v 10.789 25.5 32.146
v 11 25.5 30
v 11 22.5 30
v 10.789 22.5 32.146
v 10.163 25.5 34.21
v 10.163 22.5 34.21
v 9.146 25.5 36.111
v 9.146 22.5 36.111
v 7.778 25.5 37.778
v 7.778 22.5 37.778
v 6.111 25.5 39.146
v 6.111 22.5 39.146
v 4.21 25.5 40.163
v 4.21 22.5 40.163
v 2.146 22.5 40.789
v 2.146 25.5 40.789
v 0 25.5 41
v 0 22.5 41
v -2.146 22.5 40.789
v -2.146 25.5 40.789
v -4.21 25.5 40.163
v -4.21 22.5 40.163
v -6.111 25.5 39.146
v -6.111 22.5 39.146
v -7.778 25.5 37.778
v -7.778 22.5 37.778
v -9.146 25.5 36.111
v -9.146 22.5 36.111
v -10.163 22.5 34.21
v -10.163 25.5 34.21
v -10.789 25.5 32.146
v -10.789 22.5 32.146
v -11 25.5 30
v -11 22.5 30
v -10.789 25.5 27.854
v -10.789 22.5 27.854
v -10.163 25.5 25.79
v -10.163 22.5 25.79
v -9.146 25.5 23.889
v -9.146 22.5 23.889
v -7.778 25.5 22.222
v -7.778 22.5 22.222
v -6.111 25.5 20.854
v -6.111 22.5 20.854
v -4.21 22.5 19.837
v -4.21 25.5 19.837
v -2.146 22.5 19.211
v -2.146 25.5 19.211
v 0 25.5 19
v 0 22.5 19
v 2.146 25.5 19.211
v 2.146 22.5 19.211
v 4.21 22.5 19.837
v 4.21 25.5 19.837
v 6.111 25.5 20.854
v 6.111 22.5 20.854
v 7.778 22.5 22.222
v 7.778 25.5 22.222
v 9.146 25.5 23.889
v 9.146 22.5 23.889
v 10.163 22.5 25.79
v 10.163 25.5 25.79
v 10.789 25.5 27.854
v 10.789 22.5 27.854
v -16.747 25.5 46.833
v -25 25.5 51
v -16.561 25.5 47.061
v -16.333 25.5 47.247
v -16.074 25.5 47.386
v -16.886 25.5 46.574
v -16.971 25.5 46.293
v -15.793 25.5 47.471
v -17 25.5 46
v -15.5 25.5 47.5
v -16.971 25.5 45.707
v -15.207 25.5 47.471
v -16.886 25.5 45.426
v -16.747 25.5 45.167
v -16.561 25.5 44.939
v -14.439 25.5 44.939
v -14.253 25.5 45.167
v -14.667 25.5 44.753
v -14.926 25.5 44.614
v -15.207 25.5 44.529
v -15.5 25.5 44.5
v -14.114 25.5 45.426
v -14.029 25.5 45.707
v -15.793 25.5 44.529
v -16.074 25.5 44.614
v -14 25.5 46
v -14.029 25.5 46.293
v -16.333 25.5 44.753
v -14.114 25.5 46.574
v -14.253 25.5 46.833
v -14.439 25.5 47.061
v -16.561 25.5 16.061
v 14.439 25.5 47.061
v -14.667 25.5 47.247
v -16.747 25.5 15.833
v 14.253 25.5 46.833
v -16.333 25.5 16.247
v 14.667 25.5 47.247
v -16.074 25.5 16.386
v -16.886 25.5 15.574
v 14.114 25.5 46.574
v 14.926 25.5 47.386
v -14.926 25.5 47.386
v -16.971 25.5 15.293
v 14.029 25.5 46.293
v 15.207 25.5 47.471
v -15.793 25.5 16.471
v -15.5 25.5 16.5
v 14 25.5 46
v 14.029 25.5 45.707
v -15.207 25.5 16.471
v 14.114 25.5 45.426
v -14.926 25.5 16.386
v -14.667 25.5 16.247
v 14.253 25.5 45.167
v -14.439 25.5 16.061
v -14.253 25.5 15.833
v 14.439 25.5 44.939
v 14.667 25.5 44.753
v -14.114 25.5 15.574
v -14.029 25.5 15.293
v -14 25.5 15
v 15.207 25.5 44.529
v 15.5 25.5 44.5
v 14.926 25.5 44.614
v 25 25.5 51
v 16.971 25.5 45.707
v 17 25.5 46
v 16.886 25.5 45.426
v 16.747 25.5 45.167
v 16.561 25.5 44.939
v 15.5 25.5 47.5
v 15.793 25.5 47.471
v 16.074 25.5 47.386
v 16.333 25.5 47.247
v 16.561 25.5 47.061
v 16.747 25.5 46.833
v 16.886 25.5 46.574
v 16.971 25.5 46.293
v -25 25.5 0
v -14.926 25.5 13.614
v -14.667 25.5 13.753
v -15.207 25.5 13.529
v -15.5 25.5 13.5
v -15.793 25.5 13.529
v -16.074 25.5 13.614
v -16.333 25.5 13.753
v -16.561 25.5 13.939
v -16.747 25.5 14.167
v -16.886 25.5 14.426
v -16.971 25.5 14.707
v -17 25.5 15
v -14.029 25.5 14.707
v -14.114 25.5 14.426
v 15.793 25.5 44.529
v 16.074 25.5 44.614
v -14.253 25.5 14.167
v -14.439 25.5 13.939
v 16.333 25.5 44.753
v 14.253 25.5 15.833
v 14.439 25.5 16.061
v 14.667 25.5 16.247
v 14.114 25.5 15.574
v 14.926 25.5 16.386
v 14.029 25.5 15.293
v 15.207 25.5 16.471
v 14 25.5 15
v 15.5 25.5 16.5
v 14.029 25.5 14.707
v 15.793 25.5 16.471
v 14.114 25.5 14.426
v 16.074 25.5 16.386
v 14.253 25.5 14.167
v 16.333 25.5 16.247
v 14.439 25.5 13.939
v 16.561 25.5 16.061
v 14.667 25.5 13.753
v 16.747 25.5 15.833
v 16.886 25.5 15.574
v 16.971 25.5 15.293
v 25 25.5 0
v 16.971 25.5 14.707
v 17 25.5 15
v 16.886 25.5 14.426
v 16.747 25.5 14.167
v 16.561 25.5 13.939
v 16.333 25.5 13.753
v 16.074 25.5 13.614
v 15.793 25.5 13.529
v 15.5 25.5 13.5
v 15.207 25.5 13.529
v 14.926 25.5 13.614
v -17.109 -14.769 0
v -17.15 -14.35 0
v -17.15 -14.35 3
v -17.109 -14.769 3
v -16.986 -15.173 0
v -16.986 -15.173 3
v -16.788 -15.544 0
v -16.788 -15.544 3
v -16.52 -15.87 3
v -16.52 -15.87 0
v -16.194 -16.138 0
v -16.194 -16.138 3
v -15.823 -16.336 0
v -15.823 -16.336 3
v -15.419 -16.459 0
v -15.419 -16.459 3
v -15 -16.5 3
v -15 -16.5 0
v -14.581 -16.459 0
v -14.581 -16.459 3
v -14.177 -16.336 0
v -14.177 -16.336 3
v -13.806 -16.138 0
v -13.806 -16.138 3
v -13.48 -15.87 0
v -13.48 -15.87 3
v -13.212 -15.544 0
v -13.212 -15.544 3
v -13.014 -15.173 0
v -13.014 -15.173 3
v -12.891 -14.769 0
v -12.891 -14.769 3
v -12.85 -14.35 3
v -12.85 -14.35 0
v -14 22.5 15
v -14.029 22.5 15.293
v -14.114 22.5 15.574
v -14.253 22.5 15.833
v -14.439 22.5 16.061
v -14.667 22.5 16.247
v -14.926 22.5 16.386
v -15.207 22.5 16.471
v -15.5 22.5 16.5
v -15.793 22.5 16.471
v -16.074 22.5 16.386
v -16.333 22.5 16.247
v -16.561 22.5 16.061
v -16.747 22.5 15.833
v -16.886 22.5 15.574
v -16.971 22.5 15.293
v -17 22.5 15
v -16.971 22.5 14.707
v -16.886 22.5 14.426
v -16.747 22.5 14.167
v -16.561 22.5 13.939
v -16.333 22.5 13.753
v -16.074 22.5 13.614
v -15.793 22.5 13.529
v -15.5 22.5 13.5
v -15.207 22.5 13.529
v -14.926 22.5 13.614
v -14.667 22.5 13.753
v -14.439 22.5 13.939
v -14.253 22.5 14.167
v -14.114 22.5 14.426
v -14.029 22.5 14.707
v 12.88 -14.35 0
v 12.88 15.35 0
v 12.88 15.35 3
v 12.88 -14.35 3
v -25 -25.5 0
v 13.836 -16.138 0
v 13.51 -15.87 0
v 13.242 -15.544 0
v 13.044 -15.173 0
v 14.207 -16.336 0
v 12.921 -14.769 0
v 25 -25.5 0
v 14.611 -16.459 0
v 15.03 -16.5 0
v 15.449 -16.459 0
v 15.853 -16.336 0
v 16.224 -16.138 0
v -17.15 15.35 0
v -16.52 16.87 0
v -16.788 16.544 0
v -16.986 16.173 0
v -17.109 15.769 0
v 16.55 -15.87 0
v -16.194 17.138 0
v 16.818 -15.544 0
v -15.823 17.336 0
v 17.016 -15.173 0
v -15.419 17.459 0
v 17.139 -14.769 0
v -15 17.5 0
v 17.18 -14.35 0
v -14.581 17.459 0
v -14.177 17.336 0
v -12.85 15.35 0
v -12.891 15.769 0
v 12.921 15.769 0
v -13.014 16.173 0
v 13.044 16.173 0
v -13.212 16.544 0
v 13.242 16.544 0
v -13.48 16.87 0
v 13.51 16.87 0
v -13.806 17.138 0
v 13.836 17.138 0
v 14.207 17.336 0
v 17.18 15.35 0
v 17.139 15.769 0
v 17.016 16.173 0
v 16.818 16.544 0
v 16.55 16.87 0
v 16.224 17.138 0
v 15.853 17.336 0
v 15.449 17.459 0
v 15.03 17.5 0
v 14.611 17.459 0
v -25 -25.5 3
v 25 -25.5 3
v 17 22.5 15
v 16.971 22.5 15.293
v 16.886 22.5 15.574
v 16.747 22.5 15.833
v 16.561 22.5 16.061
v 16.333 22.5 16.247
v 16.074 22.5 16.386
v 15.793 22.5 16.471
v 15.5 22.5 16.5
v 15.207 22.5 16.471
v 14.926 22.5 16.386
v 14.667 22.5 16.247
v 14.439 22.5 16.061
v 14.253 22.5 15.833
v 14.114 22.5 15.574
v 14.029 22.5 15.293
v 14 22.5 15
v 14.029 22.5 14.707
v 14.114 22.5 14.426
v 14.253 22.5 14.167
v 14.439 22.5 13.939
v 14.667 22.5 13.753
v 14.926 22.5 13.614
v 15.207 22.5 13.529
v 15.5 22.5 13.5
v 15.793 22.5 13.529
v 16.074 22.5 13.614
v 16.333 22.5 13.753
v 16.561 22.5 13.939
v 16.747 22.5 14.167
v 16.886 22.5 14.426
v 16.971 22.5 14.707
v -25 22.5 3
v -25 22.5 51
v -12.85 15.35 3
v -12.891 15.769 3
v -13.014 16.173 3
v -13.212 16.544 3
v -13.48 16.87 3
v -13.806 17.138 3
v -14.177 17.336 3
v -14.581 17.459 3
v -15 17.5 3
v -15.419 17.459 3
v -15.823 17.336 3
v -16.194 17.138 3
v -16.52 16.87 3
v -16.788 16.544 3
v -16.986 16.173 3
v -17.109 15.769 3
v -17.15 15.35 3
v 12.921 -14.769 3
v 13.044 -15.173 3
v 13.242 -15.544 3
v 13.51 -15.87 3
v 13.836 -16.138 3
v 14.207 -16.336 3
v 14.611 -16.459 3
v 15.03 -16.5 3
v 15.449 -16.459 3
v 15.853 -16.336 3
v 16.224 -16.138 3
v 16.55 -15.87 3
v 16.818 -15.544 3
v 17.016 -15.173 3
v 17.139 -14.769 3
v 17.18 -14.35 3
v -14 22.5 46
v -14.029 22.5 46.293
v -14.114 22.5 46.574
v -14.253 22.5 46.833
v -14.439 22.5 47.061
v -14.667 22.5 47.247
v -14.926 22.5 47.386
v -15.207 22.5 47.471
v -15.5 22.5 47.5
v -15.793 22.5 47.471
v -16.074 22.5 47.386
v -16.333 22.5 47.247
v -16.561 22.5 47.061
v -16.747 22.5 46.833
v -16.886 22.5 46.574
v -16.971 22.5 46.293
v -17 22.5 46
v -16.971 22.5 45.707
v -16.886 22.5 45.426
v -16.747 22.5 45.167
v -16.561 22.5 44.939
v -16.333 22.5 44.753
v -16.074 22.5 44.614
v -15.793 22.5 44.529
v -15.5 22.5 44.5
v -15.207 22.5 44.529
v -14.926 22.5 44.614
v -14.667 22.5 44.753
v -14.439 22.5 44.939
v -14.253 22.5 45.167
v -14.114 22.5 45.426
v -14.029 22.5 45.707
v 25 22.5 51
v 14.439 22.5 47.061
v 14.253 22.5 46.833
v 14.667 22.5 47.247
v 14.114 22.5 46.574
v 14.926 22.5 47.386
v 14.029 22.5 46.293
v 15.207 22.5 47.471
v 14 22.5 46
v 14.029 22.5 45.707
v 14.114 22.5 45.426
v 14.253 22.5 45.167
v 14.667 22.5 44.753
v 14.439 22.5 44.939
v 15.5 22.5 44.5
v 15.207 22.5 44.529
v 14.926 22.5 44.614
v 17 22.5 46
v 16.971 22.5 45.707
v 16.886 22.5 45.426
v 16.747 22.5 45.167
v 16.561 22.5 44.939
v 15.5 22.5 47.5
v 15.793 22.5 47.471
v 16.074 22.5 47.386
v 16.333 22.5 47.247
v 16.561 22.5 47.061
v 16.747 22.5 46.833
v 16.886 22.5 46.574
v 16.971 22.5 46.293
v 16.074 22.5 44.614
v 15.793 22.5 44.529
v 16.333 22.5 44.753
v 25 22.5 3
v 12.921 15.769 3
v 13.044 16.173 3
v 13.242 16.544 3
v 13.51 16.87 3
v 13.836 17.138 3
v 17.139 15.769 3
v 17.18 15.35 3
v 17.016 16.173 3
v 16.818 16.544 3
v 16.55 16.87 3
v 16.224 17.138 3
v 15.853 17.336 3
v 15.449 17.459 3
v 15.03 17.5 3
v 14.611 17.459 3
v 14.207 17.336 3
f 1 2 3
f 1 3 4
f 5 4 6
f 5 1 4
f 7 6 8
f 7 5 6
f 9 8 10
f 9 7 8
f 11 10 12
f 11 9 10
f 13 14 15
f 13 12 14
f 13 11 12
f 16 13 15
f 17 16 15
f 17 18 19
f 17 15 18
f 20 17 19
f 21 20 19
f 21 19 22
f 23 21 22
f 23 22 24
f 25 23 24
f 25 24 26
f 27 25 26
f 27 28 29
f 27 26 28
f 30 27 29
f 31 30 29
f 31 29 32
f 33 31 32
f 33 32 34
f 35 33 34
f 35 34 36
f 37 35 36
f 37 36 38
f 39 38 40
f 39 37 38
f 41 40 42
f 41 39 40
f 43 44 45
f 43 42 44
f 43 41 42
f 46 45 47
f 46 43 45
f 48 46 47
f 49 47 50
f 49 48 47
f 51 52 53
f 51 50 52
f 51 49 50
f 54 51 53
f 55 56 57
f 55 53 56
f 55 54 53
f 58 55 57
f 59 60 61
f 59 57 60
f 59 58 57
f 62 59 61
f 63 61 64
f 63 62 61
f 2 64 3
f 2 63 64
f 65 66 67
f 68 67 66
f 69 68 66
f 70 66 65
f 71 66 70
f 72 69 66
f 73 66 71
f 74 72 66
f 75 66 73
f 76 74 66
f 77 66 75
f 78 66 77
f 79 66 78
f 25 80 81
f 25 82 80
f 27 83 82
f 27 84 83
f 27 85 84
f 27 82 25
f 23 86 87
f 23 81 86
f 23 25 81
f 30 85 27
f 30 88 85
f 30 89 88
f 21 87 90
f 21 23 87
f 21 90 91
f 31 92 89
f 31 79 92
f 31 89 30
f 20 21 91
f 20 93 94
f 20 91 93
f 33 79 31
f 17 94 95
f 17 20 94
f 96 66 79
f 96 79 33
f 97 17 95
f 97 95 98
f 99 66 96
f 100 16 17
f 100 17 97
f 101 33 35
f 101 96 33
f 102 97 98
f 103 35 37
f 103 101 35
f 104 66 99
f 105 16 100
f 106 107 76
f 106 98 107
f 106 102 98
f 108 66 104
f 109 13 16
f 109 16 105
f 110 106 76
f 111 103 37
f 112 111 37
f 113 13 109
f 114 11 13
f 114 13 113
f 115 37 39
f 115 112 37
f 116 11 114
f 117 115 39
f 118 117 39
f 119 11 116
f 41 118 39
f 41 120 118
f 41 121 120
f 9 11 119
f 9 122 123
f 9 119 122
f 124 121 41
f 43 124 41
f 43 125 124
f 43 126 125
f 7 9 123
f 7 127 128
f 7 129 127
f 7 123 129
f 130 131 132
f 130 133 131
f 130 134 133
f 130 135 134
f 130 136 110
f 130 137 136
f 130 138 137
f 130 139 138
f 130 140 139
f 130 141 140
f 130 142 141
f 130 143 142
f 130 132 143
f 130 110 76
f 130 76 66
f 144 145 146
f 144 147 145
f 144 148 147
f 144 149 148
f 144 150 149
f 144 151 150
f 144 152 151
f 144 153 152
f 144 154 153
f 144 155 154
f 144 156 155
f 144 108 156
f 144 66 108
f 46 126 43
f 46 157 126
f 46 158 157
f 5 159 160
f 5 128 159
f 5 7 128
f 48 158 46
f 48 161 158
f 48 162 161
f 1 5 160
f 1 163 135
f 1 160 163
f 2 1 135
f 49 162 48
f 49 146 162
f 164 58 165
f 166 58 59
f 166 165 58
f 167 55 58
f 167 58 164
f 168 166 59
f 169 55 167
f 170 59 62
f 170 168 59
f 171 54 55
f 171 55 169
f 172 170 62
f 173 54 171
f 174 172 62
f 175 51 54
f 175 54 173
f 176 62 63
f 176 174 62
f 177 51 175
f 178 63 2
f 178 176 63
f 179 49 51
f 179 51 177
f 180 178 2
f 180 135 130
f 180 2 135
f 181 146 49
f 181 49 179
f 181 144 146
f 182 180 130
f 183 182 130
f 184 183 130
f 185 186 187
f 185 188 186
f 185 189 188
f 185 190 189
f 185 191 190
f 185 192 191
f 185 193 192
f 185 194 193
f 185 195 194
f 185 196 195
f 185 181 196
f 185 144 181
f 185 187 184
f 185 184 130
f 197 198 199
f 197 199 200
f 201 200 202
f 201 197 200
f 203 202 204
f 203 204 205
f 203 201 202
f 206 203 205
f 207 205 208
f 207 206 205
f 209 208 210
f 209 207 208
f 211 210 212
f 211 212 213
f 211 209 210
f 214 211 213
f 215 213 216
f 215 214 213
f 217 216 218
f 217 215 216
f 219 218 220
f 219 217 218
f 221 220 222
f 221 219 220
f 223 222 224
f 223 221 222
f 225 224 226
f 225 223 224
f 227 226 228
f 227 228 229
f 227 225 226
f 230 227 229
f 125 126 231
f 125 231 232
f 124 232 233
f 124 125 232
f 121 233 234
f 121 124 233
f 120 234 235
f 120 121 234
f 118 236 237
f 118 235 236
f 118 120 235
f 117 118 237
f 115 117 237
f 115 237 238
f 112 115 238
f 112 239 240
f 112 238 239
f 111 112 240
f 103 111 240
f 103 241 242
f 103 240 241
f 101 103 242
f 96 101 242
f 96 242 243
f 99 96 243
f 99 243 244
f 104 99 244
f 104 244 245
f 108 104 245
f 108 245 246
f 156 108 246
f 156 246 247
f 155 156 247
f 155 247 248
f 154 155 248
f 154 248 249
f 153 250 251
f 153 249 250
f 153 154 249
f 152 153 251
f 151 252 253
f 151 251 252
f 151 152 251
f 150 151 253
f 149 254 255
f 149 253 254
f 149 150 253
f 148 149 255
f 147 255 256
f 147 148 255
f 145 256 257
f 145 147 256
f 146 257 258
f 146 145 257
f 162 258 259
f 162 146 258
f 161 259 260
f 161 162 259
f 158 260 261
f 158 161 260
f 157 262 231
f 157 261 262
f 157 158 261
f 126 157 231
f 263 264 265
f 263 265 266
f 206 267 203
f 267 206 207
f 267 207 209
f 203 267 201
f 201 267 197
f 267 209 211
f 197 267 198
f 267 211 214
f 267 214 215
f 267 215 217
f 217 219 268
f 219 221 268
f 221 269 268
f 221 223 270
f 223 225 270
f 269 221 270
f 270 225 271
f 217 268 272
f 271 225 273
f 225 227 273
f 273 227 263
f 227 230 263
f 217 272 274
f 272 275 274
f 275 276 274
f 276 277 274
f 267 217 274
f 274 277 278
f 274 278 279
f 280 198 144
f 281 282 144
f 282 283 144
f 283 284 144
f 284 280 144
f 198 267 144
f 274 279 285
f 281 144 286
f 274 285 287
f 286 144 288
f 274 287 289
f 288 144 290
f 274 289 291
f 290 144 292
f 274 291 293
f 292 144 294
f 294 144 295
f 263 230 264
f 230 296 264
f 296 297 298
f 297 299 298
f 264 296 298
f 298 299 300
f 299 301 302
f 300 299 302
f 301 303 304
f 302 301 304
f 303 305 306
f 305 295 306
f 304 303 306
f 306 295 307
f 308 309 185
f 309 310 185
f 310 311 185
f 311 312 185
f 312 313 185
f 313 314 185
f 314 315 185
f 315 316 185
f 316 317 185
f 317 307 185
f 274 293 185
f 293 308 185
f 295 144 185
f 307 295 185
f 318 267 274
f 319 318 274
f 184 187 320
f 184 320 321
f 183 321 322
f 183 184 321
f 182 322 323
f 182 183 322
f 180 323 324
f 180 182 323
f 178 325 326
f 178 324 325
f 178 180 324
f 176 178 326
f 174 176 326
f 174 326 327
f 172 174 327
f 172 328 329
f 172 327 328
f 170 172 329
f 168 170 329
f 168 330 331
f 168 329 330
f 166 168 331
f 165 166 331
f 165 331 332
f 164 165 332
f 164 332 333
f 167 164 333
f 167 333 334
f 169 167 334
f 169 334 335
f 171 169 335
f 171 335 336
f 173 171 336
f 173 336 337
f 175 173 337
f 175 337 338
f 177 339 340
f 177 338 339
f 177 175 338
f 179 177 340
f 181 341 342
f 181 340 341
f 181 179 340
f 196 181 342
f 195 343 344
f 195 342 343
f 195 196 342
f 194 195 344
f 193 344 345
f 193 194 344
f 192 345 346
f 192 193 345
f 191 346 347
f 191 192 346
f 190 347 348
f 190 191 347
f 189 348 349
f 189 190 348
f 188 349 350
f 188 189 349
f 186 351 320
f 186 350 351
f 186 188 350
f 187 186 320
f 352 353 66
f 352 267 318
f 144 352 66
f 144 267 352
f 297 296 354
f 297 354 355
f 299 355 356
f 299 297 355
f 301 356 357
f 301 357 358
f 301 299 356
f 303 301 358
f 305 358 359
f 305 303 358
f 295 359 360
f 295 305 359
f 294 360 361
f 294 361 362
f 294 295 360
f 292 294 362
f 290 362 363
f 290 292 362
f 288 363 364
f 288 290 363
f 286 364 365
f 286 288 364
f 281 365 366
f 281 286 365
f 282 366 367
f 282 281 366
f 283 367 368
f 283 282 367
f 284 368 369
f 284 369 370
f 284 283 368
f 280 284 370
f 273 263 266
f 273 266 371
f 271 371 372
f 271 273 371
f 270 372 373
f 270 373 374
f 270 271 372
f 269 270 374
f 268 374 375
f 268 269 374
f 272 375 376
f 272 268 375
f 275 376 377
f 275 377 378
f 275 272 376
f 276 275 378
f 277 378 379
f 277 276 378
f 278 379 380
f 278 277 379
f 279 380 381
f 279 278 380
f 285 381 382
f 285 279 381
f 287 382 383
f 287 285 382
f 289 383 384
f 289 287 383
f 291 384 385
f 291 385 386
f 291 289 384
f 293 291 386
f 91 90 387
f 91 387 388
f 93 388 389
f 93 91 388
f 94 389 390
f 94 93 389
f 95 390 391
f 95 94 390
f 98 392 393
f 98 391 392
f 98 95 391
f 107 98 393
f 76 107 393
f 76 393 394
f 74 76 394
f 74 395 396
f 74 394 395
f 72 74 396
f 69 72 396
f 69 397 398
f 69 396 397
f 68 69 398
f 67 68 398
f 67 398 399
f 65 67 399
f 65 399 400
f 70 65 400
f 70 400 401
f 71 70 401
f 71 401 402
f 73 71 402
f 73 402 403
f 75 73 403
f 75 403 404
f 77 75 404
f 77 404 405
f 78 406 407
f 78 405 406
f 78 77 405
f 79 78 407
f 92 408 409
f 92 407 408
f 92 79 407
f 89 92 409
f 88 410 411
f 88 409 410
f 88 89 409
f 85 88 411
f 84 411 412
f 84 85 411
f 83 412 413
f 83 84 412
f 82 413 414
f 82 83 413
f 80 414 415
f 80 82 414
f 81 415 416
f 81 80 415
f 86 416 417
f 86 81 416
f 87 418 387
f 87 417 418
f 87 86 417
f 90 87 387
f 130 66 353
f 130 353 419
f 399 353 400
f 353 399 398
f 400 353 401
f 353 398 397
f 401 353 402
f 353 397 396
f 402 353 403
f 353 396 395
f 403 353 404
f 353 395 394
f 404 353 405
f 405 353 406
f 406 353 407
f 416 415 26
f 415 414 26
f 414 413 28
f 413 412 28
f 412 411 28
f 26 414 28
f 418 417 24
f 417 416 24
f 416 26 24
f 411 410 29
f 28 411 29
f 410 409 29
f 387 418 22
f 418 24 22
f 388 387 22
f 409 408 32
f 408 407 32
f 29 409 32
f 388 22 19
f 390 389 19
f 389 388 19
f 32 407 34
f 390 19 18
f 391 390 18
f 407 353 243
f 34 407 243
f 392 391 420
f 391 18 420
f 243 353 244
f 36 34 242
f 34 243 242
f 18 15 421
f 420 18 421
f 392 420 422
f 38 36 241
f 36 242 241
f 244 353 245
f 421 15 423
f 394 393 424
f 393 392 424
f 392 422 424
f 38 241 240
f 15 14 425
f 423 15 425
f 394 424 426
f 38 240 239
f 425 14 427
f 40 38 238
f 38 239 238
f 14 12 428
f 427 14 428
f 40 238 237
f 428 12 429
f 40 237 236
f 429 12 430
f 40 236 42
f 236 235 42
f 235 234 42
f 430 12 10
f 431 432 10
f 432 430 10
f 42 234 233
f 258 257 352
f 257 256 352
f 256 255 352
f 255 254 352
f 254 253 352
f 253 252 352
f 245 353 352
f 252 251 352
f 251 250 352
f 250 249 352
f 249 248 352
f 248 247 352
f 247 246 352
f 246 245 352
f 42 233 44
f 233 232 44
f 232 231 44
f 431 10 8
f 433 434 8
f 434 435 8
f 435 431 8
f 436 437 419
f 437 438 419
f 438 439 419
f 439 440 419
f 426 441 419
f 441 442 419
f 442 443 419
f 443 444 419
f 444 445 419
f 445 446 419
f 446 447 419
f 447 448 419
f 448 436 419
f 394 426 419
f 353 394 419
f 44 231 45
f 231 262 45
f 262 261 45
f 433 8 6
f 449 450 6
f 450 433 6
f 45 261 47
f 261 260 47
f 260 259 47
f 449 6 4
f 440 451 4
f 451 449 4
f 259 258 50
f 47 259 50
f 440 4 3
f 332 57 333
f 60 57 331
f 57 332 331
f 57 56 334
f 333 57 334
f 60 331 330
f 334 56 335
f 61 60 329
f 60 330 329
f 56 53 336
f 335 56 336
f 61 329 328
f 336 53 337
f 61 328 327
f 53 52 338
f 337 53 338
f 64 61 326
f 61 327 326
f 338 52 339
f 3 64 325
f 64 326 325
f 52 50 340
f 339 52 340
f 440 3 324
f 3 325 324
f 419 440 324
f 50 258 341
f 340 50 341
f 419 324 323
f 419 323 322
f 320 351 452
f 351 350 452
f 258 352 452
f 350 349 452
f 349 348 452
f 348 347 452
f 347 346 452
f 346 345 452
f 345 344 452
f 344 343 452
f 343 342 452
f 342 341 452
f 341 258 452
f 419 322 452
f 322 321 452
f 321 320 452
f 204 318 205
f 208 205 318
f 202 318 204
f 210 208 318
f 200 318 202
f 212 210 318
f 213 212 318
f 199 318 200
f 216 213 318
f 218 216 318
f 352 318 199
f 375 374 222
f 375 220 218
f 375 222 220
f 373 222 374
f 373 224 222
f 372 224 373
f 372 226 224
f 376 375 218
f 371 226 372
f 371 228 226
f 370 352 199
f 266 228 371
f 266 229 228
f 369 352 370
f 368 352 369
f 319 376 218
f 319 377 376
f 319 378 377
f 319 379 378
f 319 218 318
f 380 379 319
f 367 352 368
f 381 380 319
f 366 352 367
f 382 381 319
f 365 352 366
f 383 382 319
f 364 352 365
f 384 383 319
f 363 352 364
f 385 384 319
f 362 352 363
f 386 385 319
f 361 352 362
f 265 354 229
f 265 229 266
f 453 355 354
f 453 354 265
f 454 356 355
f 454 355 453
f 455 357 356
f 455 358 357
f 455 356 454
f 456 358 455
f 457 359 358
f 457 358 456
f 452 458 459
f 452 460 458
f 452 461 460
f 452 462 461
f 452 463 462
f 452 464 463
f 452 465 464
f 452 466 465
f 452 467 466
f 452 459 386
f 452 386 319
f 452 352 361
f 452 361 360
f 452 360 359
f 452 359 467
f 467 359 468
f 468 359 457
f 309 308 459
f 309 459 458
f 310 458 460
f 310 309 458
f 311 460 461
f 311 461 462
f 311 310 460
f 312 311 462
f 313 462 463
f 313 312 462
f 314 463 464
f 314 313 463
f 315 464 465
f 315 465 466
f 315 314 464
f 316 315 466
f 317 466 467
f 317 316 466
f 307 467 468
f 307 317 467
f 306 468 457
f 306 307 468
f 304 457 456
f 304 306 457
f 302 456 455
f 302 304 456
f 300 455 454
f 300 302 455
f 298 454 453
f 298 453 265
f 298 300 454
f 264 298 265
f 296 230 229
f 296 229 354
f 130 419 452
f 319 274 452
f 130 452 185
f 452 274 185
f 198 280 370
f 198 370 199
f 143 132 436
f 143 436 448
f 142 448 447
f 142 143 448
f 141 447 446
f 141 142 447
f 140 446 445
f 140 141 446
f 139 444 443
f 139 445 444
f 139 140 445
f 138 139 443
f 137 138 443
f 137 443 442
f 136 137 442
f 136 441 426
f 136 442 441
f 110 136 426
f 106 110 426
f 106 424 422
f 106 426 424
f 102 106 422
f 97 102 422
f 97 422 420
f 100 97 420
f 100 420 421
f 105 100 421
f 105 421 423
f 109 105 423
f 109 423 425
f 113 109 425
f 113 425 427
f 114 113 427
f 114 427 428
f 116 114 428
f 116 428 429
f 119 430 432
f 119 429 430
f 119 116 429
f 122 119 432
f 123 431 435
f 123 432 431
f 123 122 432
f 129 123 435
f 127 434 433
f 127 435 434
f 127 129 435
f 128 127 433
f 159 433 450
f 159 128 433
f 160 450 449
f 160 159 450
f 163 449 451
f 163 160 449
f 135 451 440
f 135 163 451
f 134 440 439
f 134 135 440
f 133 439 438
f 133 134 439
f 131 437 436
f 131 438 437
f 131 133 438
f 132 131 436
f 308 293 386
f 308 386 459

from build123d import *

# Parameters (mm, degrees)
SKETCH1_W               = 50
SKETCH1_H               = 51
BOSS_EXTRUDE1_DEPTH     = 3
SKETCH2_W               = 50
SKETCH2_H               = 3
BOSS_EXTRUDE2_DEPTH     = 48
CUT_EXTRUDE1_DEPTH      = 75.36396977
CUT_EXTRUDE1_DEPTH_BACK = 75.36396977
SKETCH3_R               = 11
SKETCH3_R_2             = 1.5


with BuildPart() as part:
    # Sketch1 → Boss-Extrude1 (new body)
    with BuildSketch(Plane.XY):
        Rectangle(SKETCH1_W, SKETCH1_H)
        with BuildLine():
            Line((-17.15, 15.35), (-17.15, -14.35))
            ThreePointArc((-17.15, -14.35), (-15, -16.5), (-12.85, -14.35))
            Line((-12.85, -14.35), (-12.85, 15.35))
            ThreePointArc((-12.85, 15.35), (-15, 17.5), (-17.15, 15.35))
        make_face(mode=Mode.SUBTRACT)
        with BuildLine():
            Line((12.88, 15.35), (12.88, -14.35))
            ThreePointArc((12.88, -14.35), (15.03, -16.5), (17.18, -14.35))
            Line((17.18, -14.35), (17.18, 15.35))
            ThreePointArc((17.18, 15.35), (15.03, 17.5), (12.88, 15.35))
        make_face(mode=Mode.SUBTRACT)
    extrude(amount=BOSS_EXTRUDE1_DEPTH)

    # Sketch2 → Boss-Extrude2 (add)
    with BuildSketch(Plane.XY.offset(3)):
        with Locations((0, 24)):
            Rectangle(SKETCH2_W, SKETCH2_H)
    extrude(amount=BOSS_EXTRUDE2_DEPTH)

    # Sketch3 → Cut-Extrude1 (cut, two sides: drawn at the far end of the back side and taken through both)
    with BuildSketch(Plane.XZ.offset(-22.5).offset(-CUT_EXTRUDE1_DEPTH_BACK)):
        with Locations((0, 30)):
            Circle(SKETCH3_R)
        with Locations((-15.5, 46)):
            Circle(SKETCH3_R_2)
        with Locations((15.5, 46)):
            Circle(SKETCH3_R_2)
        with Locations((-15.5, 15)):
            Circle(SKETCH3_R_2)
        with Locations((15.5, 15)):
            Circle(SKETCH3_R_2)
    extrude(amount=CUT_EXTRUDE1_DEPTH + CUT_EXTRUDE1_DEPTH_BACK, mode=Mode.SUBTRACT)


solid = part.part
